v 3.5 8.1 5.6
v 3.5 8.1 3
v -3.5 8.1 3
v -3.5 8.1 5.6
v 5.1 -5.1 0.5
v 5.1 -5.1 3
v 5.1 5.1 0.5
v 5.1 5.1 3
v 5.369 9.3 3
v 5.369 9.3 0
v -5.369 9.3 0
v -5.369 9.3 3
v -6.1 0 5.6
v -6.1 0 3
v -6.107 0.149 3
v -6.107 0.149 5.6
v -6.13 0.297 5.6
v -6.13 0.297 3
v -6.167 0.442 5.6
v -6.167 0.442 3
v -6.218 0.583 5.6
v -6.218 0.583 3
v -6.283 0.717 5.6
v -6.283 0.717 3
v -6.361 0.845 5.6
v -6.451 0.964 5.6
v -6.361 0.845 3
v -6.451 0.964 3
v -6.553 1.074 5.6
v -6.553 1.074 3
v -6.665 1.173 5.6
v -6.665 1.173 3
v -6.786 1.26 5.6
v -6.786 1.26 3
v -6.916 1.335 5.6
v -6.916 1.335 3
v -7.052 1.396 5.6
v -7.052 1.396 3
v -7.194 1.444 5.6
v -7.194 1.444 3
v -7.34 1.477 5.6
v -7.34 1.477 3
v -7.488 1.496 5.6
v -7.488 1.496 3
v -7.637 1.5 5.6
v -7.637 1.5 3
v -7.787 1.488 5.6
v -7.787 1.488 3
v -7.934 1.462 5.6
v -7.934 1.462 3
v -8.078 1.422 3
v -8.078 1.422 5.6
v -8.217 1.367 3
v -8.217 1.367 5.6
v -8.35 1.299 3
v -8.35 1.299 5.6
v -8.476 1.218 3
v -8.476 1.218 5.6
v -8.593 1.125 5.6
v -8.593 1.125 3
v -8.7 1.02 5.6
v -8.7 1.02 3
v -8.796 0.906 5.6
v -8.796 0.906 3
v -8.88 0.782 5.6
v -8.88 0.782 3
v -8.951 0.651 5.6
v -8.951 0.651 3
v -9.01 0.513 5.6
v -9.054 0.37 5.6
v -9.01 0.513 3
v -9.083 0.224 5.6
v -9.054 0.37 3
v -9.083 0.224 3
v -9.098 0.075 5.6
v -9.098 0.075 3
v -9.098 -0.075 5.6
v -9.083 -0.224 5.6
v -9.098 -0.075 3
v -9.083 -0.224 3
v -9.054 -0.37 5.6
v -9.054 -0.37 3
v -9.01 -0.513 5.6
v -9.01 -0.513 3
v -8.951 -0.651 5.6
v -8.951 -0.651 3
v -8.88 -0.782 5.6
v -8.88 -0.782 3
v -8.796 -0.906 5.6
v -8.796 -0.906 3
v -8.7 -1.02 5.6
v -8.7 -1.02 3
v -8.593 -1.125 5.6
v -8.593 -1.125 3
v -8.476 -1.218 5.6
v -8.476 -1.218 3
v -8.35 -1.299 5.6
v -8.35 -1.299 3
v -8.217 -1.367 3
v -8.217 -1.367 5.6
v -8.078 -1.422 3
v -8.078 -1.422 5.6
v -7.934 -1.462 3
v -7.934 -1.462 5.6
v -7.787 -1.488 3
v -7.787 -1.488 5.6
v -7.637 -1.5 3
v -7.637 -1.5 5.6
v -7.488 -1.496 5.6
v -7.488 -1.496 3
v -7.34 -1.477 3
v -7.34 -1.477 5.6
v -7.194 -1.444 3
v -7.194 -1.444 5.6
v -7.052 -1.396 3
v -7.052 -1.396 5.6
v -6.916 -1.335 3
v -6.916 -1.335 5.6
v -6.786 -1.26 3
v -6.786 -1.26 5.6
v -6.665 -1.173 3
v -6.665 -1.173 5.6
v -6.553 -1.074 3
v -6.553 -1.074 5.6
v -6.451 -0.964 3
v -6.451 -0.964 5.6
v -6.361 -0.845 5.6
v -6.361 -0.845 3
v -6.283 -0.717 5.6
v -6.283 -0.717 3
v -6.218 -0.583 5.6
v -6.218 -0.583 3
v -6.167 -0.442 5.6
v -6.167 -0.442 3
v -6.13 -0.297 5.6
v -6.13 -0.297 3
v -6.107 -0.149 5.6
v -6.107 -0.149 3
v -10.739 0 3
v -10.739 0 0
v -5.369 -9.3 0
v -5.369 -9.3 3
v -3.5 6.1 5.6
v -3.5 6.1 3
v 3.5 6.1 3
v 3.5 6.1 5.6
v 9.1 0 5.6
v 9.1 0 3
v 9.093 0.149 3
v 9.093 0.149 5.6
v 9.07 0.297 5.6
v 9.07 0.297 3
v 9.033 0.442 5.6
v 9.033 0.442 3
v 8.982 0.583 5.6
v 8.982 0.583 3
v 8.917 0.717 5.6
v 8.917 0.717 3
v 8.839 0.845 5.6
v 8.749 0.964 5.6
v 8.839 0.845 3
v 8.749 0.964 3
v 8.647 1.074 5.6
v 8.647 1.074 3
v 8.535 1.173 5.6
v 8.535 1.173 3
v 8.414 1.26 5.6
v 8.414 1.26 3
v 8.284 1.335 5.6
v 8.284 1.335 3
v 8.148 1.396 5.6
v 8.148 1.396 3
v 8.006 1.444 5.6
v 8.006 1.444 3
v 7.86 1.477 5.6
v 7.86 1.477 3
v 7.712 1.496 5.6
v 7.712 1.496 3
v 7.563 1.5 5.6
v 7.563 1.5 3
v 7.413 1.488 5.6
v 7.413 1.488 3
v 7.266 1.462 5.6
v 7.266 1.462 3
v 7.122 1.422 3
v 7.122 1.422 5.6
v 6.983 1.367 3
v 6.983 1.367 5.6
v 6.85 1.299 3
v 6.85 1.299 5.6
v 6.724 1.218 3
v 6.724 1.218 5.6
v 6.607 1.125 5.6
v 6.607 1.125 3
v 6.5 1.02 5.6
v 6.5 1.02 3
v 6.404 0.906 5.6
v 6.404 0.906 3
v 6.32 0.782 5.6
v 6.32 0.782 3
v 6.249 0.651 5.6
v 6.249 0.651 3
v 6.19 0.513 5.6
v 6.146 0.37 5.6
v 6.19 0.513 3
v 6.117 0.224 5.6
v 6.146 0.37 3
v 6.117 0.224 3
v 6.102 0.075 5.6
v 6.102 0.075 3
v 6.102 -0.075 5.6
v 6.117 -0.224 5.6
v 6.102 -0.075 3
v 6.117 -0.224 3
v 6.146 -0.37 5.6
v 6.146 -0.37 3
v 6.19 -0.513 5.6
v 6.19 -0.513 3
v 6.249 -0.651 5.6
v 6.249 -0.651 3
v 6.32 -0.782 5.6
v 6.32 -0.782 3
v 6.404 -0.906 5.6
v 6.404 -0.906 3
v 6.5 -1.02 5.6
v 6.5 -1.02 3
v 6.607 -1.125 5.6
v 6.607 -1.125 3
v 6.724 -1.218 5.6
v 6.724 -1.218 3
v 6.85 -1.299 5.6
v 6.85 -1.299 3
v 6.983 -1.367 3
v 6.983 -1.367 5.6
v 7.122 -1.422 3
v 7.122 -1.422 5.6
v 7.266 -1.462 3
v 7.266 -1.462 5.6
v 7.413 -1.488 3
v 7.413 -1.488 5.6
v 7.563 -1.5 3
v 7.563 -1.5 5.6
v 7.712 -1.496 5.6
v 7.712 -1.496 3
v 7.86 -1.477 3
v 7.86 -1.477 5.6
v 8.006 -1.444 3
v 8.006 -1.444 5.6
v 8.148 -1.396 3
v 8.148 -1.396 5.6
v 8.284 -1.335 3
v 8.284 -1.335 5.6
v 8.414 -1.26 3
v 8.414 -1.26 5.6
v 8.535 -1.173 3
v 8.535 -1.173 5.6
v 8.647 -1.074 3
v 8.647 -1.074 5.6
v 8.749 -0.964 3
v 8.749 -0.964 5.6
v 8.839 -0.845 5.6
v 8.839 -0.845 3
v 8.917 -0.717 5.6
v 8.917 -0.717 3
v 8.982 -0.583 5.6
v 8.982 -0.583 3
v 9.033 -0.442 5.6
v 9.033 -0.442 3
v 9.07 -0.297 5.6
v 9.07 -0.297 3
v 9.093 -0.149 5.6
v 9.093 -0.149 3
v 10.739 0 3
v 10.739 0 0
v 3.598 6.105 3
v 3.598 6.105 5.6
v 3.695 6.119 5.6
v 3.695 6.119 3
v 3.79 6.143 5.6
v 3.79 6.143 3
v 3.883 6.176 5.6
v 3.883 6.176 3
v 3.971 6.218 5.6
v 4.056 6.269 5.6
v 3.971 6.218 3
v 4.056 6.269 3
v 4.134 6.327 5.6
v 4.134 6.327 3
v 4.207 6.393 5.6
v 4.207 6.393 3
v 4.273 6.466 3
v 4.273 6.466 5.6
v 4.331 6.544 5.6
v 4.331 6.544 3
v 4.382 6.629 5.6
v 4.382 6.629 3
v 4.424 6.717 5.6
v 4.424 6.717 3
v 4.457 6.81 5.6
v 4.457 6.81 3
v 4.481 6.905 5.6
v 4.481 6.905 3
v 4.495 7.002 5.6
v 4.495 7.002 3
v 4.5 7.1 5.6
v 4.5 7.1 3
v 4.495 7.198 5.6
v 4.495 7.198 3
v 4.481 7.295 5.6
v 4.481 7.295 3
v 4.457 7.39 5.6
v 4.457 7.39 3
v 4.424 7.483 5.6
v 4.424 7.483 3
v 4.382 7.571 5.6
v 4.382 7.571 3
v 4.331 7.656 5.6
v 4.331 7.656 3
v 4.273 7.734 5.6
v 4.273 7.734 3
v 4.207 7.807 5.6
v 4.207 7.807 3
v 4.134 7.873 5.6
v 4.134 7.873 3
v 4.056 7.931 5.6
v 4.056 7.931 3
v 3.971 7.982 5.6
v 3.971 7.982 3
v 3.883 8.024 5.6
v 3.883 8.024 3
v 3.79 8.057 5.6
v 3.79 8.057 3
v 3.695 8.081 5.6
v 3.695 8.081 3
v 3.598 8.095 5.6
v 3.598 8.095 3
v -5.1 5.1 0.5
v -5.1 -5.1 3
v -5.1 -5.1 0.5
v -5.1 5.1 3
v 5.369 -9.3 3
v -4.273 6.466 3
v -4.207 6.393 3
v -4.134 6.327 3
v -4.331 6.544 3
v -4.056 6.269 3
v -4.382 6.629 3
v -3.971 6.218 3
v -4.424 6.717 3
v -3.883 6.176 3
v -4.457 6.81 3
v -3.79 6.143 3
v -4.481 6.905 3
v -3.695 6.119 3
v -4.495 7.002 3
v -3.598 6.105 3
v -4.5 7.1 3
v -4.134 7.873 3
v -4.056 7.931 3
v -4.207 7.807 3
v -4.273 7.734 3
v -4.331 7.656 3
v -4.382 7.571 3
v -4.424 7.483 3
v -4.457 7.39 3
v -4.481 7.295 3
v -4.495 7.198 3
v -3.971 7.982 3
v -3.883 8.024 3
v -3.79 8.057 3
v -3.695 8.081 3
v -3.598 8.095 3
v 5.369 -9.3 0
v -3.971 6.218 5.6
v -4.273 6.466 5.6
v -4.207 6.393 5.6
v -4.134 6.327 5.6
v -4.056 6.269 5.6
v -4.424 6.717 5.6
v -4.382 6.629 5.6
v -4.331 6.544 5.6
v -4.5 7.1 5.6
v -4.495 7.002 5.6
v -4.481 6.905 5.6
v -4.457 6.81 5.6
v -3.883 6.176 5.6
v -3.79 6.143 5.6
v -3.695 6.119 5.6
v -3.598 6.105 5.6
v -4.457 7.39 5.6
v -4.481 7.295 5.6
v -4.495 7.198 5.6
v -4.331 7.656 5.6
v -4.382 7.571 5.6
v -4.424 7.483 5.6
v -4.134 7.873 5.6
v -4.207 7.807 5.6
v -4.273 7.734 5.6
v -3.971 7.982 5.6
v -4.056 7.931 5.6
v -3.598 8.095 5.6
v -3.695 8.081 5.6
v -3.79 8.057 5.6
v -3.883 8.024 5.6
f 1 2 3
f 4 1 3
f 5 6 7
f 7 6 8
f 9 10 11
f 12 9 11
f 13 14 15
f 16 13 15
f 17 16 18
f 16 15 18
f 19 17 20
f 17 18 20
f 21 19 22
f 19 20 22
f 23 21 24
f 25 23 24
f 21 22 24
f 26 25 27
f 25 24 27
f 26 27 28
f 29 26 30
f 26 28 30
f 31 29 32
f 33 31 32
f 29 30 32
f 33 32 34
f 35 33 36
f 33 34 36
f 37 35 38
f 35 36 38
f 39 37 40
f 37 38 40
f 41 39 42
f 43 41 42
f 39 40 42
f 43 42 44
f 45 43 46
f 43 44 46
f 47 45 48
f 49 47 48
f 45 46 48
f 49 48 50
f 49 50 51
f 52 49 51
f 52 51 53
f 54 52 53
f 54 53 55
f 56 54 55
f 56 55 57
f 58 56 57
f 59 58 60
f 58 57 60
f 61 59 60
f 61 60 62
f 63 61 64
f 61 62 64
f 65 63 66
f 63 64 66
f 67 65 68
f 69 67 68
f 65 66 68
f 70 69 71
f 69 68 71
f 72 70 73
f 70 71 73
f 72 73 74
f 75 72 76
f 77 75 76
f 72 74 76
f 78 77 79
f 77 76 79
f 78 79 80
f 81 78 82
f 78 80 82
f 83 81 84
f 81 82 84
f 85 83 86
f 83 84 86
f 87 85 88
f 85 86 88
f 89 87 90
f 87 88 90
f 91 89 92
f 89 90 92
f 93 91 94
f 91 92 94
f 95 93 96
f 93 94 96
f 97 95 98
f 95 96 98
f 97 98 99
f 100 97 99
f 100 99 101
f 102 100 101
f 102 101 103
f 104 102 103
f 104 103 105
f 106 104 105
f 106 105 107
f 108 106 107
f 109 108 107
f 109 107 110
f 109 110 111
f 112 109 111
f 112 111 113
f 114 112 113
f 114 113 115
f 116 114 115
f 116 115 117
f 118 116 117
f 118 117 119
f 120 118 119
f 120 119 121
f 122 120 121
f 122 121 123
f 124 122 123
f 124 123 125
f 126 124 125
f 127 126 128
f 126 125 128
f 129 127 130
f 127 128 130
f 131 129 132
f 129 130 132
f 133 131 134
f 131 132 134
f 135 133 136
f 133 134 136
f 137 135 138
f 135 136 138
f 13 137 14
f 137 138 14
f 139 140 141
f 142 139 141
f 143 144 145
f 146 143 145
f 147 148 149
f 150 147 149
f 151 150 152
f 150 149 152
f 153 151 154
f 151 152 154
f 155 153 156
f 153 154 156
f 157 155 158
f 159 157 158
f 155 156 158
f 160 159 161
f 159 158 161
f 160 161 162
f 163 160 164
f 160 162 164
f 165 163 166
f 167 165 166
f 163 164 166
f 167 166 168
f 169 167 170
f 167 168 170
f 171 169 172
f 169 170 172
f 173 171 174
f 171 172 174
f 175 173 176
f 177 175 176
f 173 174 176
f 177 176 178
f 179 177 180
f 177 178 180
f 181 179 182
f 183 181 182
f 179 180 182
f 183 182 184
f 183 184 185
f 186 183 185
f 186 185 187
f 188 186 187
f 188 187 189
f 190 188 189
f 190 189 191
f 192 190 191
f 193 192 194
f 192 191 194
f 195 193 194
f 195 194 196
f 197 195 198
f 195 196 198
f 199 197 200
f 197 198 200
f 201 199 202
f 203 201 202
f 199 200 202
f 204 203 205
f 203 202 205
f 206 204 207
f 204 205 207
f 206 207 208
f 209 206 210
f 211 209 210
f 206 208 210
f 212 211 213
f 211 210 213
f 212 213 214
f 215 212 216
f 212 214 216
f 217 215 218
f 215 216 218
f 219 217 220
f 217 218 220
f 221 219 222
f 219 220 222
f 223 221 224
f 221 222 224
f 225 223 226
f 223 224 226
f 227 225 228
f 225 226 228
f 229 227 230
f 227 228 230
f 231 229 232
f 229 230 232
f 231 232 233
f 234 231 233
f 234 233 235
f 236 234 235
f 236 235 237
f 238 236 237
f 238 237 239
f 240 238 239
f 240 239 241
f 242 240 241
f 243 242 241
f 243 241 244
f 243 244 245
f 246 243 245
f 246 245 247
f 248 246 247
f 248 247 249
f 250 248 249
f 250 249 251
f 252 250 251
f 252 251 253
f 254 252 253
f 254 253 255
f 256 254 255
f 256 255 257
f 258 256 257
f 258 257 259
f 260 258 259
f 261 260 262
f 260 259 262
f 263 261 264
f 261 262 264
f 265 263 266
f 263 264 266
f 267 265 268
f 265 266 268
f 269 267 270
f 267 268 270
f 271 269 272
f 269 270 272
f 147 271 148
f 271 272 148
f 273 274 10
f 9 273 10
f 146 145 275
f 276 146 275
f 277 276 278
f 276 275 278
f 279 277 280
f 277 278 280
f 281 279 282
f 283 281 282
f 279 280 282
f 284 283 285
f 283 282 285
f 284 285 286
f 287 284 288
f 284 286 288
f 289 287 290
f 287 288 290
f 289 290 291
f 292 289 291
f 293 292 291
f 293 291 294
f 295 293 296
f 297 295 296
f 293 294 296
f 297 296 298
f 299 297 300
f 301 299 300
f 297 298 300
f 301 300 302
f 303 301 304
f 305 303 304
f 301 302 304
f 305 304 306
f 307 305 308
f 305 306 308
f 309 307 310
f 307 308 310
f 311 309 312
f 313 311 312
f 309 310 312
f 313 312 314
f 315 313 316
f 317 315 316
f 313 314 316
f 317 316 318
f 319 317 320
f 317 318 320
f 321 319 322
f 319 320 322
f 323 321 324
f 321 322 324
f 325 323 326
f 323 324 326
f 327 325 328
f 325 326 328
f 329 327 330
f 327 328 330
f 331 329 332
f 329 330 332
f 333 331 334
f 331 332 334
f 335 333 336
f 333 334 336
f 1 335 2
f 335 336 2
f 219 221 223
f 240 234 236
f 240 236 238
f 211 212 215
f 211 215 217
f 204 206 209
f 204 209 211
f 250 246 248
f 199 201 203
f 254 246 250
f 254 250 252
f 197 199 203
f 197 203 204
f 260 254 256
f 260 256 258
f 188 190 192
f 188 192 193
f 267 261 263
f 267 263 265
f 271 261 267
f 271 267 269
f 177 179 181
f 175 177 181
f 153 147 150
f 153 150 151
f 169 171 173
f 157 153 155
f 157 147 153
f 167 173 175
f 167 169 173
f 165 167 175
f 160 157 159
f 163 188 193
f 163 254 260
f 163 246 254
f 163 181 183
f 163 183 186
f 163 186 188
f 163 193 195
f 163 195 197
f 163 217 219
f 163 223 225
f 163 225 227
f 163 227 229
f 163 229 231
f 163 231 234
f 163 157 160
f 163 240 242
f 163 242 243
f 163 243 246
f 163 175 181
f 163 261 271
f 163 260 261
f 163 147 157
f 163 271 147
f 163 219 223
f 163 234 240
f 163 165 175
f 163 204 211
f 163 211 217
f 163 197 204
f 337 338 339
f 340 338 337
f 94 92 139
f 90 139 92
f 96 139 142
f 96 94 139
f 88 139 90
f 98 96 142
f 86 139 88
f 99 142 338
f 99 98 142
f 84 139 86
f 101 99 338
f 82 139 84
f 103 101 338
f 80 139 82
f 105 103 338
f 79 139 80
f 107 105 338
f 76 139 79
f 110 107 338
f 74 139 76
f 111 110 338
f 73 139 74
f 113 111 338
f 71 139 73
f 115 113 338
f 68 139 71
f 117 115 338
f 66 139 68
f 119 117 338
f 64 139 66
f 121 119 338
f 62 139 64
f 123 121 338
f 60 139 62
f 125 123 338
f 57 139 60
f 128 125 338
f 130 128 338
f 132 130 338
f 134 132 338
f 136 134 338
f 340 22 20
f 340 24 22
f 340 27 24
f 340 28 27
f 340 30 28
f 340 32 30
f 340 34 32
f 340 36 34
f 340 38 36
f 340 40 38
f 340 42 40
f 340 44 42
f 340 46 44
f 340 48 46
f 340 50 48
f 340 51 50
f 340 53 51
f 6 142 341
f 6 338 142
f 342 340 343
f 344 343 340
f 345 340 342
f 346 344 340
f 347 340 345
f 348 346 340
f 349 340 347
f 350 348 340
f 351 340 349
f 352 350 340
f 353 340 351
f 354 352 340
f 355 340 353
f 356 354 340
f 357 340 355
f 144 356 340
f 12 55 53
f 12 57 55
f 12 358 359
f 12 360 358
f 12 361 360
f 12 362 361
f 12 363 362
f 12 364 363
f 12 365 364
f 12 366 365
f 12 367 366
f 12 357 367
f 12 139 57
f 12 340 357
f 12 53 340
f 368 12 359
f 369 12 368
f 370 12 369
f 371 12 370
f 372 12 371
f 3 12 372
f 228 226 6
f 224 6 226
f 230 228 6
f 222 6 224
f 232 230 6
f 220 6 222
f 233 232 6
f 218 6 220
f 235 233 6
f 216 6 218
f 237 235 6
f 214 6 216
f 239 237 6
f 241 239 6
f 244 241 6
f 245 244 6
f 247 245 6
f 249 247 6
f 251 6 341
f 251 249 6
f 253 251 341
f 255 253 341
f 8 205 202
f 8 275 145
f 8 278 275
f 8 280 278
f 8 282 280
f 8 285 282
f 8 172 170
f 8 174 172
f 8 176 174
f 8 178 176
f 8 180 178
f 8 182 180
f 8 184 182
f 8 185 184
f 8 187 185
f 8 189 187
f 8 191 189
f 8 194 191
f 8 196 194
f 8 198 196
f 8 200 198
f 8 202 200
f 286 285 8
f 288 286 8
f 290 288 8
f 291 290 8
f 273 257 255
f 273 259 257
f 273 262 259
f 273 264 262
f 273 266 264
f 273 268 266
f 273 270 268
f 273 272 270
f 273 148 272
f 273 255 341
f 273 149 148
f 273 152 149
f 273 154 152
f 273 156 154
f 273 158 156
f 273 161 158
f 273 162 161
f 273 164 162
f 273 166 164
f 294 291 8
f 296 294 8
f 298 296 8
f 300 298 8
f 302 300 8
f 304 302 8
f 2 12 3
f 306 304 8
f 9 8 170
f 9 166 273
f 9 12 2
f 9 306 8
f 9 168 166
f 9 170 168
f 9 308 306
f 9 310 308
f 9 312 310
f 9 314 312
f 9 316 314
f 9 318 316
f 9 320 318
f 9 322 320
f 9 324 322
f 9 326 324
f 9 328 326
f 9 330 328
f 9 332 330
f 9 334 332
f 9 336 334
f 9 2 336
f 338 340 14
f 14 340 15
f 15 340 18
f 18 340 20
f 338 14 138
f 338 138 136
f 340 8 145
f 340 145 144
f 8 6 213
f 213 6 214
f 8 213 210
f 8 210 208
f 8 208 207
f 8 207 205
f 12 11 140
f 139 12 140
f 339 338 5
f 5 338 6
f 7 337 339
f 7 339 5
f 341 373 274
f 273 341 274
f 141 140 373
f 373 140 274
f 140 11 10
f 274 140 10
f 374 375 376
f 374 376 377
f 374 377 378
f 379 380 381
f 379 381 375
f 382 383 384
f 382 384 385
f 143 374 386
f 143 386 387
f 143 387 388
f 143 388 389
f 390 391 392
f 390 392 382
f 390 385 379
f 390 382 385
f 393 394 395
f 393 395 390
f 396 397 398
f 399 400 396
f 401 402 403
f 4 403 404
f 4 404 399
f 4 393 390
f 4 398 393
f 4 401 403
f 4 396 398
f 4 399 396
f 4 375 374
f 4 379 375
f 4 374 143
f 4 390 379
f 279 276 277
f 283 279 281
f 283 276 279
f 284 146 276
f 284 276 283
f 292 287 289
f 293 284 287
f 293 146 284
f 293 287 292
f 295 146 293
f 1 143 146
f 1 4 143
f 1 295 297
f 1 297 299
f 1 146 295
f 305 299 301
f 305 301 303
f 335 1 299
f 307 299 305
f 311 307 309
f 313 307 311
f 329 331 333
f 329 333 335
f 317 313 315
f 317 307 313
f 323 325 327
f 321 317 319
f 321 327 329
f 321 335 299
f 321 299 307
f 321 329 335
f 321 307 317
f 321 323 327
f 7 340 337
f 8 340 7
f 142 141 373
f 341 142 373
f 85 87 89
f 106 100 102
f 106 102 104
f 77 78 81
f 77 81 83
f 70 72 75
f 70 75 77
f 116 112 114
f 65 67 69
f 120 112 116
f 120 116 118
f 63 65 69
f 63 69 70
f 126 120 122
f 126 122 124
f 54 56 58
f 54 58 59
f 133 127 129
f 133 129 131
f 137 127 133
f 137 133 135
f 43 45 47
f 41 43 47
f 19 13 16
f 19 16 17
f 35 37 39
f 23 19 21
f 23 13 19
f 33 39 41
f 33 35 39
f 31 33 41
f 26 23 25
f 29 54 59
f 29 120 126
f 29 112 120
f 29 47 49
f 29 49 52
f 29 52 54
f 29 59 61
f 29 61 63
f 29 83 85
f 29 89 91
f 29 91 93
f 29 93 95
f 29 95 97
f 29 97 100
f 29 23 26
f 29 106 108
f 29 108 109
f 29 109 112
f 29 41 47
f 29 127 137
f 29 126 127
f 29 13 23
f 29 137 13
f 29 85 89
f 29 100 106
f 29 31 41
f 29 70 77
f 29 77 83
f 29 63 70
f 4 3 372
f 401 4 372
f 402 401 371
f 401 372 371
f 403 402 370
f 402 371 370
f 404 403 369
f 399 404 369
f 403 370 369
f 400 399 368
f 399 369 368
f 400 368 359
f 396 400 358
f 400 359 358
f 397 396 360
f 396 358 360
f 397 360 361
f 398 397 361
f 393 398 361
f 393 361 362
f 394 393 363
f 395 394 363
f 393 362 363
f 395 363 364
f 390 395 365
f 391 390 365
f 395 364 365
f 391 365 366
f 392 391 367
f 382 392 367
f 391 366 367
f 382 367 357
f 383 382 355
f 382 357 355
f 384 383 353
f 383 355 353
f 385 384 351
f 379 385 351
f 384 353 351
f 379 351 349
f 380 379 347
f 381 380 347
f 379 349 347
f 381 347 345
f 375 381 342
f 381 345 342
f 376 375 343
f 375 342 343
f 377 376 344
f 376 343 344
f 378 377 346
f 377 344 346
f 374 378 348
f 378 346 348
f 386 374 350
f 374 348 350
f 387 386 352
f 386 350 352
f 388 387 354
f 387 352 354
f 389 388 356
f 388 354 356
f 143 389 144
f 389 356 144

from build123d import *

# Parameters (mm, degrees)
PAD002_DEPTH    = 3
SKETCH004_R     = 1.5
PAD004_DEPTH    = 2.6
SKETCH005_W     = 10.2
SKETCH005_H     = 10.2
POCKET001_DEPTH = 2.5


with BuildPart() as part:
    # Sketch002 → Pad002 (new body)
    with BuildSketch(Plane.XY):
        Polygon((-5.369358, 9.3), (-10.738715, 0), (-5.369358, -9.3), (5.369358, -9.3), (10.738715, 0), (5.369358, 9.3), align=None)
    extrude(amount=PAD002_DEPTH)


with BuildPart() as part_1:
    # Body002 placement: moved
    add(part.part.moved(Location((0, 0, 3))))


with BuildPart() as part_2:
    # Clone placement: moved
    add(part_1.part.moved(Location((0, 0, -3))))

    # Sketch004 (on DatumPlane) → Pad004 (new body)
    with BuildSketch(Plane.XY.offset(3)):
        with Locations((-7.6, 0)):
            Circle(SKETCH004_R)
        with Locations((7.6, 0)):
            Circle(SKETCH004_R)
        with BuildLine():
            ThreePointArc((-3.5, 8.1), (-4.5, 7.1), (-3.5, 6.1))
            Line((-3.5, 6.1), (3.5, 6.1))
            ThreePointArc((3.5, 6.1), (4.5, 7.1), (3.5, 8.1))
            Line((3.5, 8.1), (-3.5, 8.1))
        make_face()
    extrude(amount=PAD004_DEPTH)

    # Sketch005 (on DatumPlane) → Pocket001 (cut)
    with BuildSketch(Plane.XY.offset(3)):
        Rectangle(SKETCH005_W, SKETCH005_H)
    extrude(amount=-POCKET001_DEPTH, mode=Mode.SUBTRACT)


solid = part_2.part
